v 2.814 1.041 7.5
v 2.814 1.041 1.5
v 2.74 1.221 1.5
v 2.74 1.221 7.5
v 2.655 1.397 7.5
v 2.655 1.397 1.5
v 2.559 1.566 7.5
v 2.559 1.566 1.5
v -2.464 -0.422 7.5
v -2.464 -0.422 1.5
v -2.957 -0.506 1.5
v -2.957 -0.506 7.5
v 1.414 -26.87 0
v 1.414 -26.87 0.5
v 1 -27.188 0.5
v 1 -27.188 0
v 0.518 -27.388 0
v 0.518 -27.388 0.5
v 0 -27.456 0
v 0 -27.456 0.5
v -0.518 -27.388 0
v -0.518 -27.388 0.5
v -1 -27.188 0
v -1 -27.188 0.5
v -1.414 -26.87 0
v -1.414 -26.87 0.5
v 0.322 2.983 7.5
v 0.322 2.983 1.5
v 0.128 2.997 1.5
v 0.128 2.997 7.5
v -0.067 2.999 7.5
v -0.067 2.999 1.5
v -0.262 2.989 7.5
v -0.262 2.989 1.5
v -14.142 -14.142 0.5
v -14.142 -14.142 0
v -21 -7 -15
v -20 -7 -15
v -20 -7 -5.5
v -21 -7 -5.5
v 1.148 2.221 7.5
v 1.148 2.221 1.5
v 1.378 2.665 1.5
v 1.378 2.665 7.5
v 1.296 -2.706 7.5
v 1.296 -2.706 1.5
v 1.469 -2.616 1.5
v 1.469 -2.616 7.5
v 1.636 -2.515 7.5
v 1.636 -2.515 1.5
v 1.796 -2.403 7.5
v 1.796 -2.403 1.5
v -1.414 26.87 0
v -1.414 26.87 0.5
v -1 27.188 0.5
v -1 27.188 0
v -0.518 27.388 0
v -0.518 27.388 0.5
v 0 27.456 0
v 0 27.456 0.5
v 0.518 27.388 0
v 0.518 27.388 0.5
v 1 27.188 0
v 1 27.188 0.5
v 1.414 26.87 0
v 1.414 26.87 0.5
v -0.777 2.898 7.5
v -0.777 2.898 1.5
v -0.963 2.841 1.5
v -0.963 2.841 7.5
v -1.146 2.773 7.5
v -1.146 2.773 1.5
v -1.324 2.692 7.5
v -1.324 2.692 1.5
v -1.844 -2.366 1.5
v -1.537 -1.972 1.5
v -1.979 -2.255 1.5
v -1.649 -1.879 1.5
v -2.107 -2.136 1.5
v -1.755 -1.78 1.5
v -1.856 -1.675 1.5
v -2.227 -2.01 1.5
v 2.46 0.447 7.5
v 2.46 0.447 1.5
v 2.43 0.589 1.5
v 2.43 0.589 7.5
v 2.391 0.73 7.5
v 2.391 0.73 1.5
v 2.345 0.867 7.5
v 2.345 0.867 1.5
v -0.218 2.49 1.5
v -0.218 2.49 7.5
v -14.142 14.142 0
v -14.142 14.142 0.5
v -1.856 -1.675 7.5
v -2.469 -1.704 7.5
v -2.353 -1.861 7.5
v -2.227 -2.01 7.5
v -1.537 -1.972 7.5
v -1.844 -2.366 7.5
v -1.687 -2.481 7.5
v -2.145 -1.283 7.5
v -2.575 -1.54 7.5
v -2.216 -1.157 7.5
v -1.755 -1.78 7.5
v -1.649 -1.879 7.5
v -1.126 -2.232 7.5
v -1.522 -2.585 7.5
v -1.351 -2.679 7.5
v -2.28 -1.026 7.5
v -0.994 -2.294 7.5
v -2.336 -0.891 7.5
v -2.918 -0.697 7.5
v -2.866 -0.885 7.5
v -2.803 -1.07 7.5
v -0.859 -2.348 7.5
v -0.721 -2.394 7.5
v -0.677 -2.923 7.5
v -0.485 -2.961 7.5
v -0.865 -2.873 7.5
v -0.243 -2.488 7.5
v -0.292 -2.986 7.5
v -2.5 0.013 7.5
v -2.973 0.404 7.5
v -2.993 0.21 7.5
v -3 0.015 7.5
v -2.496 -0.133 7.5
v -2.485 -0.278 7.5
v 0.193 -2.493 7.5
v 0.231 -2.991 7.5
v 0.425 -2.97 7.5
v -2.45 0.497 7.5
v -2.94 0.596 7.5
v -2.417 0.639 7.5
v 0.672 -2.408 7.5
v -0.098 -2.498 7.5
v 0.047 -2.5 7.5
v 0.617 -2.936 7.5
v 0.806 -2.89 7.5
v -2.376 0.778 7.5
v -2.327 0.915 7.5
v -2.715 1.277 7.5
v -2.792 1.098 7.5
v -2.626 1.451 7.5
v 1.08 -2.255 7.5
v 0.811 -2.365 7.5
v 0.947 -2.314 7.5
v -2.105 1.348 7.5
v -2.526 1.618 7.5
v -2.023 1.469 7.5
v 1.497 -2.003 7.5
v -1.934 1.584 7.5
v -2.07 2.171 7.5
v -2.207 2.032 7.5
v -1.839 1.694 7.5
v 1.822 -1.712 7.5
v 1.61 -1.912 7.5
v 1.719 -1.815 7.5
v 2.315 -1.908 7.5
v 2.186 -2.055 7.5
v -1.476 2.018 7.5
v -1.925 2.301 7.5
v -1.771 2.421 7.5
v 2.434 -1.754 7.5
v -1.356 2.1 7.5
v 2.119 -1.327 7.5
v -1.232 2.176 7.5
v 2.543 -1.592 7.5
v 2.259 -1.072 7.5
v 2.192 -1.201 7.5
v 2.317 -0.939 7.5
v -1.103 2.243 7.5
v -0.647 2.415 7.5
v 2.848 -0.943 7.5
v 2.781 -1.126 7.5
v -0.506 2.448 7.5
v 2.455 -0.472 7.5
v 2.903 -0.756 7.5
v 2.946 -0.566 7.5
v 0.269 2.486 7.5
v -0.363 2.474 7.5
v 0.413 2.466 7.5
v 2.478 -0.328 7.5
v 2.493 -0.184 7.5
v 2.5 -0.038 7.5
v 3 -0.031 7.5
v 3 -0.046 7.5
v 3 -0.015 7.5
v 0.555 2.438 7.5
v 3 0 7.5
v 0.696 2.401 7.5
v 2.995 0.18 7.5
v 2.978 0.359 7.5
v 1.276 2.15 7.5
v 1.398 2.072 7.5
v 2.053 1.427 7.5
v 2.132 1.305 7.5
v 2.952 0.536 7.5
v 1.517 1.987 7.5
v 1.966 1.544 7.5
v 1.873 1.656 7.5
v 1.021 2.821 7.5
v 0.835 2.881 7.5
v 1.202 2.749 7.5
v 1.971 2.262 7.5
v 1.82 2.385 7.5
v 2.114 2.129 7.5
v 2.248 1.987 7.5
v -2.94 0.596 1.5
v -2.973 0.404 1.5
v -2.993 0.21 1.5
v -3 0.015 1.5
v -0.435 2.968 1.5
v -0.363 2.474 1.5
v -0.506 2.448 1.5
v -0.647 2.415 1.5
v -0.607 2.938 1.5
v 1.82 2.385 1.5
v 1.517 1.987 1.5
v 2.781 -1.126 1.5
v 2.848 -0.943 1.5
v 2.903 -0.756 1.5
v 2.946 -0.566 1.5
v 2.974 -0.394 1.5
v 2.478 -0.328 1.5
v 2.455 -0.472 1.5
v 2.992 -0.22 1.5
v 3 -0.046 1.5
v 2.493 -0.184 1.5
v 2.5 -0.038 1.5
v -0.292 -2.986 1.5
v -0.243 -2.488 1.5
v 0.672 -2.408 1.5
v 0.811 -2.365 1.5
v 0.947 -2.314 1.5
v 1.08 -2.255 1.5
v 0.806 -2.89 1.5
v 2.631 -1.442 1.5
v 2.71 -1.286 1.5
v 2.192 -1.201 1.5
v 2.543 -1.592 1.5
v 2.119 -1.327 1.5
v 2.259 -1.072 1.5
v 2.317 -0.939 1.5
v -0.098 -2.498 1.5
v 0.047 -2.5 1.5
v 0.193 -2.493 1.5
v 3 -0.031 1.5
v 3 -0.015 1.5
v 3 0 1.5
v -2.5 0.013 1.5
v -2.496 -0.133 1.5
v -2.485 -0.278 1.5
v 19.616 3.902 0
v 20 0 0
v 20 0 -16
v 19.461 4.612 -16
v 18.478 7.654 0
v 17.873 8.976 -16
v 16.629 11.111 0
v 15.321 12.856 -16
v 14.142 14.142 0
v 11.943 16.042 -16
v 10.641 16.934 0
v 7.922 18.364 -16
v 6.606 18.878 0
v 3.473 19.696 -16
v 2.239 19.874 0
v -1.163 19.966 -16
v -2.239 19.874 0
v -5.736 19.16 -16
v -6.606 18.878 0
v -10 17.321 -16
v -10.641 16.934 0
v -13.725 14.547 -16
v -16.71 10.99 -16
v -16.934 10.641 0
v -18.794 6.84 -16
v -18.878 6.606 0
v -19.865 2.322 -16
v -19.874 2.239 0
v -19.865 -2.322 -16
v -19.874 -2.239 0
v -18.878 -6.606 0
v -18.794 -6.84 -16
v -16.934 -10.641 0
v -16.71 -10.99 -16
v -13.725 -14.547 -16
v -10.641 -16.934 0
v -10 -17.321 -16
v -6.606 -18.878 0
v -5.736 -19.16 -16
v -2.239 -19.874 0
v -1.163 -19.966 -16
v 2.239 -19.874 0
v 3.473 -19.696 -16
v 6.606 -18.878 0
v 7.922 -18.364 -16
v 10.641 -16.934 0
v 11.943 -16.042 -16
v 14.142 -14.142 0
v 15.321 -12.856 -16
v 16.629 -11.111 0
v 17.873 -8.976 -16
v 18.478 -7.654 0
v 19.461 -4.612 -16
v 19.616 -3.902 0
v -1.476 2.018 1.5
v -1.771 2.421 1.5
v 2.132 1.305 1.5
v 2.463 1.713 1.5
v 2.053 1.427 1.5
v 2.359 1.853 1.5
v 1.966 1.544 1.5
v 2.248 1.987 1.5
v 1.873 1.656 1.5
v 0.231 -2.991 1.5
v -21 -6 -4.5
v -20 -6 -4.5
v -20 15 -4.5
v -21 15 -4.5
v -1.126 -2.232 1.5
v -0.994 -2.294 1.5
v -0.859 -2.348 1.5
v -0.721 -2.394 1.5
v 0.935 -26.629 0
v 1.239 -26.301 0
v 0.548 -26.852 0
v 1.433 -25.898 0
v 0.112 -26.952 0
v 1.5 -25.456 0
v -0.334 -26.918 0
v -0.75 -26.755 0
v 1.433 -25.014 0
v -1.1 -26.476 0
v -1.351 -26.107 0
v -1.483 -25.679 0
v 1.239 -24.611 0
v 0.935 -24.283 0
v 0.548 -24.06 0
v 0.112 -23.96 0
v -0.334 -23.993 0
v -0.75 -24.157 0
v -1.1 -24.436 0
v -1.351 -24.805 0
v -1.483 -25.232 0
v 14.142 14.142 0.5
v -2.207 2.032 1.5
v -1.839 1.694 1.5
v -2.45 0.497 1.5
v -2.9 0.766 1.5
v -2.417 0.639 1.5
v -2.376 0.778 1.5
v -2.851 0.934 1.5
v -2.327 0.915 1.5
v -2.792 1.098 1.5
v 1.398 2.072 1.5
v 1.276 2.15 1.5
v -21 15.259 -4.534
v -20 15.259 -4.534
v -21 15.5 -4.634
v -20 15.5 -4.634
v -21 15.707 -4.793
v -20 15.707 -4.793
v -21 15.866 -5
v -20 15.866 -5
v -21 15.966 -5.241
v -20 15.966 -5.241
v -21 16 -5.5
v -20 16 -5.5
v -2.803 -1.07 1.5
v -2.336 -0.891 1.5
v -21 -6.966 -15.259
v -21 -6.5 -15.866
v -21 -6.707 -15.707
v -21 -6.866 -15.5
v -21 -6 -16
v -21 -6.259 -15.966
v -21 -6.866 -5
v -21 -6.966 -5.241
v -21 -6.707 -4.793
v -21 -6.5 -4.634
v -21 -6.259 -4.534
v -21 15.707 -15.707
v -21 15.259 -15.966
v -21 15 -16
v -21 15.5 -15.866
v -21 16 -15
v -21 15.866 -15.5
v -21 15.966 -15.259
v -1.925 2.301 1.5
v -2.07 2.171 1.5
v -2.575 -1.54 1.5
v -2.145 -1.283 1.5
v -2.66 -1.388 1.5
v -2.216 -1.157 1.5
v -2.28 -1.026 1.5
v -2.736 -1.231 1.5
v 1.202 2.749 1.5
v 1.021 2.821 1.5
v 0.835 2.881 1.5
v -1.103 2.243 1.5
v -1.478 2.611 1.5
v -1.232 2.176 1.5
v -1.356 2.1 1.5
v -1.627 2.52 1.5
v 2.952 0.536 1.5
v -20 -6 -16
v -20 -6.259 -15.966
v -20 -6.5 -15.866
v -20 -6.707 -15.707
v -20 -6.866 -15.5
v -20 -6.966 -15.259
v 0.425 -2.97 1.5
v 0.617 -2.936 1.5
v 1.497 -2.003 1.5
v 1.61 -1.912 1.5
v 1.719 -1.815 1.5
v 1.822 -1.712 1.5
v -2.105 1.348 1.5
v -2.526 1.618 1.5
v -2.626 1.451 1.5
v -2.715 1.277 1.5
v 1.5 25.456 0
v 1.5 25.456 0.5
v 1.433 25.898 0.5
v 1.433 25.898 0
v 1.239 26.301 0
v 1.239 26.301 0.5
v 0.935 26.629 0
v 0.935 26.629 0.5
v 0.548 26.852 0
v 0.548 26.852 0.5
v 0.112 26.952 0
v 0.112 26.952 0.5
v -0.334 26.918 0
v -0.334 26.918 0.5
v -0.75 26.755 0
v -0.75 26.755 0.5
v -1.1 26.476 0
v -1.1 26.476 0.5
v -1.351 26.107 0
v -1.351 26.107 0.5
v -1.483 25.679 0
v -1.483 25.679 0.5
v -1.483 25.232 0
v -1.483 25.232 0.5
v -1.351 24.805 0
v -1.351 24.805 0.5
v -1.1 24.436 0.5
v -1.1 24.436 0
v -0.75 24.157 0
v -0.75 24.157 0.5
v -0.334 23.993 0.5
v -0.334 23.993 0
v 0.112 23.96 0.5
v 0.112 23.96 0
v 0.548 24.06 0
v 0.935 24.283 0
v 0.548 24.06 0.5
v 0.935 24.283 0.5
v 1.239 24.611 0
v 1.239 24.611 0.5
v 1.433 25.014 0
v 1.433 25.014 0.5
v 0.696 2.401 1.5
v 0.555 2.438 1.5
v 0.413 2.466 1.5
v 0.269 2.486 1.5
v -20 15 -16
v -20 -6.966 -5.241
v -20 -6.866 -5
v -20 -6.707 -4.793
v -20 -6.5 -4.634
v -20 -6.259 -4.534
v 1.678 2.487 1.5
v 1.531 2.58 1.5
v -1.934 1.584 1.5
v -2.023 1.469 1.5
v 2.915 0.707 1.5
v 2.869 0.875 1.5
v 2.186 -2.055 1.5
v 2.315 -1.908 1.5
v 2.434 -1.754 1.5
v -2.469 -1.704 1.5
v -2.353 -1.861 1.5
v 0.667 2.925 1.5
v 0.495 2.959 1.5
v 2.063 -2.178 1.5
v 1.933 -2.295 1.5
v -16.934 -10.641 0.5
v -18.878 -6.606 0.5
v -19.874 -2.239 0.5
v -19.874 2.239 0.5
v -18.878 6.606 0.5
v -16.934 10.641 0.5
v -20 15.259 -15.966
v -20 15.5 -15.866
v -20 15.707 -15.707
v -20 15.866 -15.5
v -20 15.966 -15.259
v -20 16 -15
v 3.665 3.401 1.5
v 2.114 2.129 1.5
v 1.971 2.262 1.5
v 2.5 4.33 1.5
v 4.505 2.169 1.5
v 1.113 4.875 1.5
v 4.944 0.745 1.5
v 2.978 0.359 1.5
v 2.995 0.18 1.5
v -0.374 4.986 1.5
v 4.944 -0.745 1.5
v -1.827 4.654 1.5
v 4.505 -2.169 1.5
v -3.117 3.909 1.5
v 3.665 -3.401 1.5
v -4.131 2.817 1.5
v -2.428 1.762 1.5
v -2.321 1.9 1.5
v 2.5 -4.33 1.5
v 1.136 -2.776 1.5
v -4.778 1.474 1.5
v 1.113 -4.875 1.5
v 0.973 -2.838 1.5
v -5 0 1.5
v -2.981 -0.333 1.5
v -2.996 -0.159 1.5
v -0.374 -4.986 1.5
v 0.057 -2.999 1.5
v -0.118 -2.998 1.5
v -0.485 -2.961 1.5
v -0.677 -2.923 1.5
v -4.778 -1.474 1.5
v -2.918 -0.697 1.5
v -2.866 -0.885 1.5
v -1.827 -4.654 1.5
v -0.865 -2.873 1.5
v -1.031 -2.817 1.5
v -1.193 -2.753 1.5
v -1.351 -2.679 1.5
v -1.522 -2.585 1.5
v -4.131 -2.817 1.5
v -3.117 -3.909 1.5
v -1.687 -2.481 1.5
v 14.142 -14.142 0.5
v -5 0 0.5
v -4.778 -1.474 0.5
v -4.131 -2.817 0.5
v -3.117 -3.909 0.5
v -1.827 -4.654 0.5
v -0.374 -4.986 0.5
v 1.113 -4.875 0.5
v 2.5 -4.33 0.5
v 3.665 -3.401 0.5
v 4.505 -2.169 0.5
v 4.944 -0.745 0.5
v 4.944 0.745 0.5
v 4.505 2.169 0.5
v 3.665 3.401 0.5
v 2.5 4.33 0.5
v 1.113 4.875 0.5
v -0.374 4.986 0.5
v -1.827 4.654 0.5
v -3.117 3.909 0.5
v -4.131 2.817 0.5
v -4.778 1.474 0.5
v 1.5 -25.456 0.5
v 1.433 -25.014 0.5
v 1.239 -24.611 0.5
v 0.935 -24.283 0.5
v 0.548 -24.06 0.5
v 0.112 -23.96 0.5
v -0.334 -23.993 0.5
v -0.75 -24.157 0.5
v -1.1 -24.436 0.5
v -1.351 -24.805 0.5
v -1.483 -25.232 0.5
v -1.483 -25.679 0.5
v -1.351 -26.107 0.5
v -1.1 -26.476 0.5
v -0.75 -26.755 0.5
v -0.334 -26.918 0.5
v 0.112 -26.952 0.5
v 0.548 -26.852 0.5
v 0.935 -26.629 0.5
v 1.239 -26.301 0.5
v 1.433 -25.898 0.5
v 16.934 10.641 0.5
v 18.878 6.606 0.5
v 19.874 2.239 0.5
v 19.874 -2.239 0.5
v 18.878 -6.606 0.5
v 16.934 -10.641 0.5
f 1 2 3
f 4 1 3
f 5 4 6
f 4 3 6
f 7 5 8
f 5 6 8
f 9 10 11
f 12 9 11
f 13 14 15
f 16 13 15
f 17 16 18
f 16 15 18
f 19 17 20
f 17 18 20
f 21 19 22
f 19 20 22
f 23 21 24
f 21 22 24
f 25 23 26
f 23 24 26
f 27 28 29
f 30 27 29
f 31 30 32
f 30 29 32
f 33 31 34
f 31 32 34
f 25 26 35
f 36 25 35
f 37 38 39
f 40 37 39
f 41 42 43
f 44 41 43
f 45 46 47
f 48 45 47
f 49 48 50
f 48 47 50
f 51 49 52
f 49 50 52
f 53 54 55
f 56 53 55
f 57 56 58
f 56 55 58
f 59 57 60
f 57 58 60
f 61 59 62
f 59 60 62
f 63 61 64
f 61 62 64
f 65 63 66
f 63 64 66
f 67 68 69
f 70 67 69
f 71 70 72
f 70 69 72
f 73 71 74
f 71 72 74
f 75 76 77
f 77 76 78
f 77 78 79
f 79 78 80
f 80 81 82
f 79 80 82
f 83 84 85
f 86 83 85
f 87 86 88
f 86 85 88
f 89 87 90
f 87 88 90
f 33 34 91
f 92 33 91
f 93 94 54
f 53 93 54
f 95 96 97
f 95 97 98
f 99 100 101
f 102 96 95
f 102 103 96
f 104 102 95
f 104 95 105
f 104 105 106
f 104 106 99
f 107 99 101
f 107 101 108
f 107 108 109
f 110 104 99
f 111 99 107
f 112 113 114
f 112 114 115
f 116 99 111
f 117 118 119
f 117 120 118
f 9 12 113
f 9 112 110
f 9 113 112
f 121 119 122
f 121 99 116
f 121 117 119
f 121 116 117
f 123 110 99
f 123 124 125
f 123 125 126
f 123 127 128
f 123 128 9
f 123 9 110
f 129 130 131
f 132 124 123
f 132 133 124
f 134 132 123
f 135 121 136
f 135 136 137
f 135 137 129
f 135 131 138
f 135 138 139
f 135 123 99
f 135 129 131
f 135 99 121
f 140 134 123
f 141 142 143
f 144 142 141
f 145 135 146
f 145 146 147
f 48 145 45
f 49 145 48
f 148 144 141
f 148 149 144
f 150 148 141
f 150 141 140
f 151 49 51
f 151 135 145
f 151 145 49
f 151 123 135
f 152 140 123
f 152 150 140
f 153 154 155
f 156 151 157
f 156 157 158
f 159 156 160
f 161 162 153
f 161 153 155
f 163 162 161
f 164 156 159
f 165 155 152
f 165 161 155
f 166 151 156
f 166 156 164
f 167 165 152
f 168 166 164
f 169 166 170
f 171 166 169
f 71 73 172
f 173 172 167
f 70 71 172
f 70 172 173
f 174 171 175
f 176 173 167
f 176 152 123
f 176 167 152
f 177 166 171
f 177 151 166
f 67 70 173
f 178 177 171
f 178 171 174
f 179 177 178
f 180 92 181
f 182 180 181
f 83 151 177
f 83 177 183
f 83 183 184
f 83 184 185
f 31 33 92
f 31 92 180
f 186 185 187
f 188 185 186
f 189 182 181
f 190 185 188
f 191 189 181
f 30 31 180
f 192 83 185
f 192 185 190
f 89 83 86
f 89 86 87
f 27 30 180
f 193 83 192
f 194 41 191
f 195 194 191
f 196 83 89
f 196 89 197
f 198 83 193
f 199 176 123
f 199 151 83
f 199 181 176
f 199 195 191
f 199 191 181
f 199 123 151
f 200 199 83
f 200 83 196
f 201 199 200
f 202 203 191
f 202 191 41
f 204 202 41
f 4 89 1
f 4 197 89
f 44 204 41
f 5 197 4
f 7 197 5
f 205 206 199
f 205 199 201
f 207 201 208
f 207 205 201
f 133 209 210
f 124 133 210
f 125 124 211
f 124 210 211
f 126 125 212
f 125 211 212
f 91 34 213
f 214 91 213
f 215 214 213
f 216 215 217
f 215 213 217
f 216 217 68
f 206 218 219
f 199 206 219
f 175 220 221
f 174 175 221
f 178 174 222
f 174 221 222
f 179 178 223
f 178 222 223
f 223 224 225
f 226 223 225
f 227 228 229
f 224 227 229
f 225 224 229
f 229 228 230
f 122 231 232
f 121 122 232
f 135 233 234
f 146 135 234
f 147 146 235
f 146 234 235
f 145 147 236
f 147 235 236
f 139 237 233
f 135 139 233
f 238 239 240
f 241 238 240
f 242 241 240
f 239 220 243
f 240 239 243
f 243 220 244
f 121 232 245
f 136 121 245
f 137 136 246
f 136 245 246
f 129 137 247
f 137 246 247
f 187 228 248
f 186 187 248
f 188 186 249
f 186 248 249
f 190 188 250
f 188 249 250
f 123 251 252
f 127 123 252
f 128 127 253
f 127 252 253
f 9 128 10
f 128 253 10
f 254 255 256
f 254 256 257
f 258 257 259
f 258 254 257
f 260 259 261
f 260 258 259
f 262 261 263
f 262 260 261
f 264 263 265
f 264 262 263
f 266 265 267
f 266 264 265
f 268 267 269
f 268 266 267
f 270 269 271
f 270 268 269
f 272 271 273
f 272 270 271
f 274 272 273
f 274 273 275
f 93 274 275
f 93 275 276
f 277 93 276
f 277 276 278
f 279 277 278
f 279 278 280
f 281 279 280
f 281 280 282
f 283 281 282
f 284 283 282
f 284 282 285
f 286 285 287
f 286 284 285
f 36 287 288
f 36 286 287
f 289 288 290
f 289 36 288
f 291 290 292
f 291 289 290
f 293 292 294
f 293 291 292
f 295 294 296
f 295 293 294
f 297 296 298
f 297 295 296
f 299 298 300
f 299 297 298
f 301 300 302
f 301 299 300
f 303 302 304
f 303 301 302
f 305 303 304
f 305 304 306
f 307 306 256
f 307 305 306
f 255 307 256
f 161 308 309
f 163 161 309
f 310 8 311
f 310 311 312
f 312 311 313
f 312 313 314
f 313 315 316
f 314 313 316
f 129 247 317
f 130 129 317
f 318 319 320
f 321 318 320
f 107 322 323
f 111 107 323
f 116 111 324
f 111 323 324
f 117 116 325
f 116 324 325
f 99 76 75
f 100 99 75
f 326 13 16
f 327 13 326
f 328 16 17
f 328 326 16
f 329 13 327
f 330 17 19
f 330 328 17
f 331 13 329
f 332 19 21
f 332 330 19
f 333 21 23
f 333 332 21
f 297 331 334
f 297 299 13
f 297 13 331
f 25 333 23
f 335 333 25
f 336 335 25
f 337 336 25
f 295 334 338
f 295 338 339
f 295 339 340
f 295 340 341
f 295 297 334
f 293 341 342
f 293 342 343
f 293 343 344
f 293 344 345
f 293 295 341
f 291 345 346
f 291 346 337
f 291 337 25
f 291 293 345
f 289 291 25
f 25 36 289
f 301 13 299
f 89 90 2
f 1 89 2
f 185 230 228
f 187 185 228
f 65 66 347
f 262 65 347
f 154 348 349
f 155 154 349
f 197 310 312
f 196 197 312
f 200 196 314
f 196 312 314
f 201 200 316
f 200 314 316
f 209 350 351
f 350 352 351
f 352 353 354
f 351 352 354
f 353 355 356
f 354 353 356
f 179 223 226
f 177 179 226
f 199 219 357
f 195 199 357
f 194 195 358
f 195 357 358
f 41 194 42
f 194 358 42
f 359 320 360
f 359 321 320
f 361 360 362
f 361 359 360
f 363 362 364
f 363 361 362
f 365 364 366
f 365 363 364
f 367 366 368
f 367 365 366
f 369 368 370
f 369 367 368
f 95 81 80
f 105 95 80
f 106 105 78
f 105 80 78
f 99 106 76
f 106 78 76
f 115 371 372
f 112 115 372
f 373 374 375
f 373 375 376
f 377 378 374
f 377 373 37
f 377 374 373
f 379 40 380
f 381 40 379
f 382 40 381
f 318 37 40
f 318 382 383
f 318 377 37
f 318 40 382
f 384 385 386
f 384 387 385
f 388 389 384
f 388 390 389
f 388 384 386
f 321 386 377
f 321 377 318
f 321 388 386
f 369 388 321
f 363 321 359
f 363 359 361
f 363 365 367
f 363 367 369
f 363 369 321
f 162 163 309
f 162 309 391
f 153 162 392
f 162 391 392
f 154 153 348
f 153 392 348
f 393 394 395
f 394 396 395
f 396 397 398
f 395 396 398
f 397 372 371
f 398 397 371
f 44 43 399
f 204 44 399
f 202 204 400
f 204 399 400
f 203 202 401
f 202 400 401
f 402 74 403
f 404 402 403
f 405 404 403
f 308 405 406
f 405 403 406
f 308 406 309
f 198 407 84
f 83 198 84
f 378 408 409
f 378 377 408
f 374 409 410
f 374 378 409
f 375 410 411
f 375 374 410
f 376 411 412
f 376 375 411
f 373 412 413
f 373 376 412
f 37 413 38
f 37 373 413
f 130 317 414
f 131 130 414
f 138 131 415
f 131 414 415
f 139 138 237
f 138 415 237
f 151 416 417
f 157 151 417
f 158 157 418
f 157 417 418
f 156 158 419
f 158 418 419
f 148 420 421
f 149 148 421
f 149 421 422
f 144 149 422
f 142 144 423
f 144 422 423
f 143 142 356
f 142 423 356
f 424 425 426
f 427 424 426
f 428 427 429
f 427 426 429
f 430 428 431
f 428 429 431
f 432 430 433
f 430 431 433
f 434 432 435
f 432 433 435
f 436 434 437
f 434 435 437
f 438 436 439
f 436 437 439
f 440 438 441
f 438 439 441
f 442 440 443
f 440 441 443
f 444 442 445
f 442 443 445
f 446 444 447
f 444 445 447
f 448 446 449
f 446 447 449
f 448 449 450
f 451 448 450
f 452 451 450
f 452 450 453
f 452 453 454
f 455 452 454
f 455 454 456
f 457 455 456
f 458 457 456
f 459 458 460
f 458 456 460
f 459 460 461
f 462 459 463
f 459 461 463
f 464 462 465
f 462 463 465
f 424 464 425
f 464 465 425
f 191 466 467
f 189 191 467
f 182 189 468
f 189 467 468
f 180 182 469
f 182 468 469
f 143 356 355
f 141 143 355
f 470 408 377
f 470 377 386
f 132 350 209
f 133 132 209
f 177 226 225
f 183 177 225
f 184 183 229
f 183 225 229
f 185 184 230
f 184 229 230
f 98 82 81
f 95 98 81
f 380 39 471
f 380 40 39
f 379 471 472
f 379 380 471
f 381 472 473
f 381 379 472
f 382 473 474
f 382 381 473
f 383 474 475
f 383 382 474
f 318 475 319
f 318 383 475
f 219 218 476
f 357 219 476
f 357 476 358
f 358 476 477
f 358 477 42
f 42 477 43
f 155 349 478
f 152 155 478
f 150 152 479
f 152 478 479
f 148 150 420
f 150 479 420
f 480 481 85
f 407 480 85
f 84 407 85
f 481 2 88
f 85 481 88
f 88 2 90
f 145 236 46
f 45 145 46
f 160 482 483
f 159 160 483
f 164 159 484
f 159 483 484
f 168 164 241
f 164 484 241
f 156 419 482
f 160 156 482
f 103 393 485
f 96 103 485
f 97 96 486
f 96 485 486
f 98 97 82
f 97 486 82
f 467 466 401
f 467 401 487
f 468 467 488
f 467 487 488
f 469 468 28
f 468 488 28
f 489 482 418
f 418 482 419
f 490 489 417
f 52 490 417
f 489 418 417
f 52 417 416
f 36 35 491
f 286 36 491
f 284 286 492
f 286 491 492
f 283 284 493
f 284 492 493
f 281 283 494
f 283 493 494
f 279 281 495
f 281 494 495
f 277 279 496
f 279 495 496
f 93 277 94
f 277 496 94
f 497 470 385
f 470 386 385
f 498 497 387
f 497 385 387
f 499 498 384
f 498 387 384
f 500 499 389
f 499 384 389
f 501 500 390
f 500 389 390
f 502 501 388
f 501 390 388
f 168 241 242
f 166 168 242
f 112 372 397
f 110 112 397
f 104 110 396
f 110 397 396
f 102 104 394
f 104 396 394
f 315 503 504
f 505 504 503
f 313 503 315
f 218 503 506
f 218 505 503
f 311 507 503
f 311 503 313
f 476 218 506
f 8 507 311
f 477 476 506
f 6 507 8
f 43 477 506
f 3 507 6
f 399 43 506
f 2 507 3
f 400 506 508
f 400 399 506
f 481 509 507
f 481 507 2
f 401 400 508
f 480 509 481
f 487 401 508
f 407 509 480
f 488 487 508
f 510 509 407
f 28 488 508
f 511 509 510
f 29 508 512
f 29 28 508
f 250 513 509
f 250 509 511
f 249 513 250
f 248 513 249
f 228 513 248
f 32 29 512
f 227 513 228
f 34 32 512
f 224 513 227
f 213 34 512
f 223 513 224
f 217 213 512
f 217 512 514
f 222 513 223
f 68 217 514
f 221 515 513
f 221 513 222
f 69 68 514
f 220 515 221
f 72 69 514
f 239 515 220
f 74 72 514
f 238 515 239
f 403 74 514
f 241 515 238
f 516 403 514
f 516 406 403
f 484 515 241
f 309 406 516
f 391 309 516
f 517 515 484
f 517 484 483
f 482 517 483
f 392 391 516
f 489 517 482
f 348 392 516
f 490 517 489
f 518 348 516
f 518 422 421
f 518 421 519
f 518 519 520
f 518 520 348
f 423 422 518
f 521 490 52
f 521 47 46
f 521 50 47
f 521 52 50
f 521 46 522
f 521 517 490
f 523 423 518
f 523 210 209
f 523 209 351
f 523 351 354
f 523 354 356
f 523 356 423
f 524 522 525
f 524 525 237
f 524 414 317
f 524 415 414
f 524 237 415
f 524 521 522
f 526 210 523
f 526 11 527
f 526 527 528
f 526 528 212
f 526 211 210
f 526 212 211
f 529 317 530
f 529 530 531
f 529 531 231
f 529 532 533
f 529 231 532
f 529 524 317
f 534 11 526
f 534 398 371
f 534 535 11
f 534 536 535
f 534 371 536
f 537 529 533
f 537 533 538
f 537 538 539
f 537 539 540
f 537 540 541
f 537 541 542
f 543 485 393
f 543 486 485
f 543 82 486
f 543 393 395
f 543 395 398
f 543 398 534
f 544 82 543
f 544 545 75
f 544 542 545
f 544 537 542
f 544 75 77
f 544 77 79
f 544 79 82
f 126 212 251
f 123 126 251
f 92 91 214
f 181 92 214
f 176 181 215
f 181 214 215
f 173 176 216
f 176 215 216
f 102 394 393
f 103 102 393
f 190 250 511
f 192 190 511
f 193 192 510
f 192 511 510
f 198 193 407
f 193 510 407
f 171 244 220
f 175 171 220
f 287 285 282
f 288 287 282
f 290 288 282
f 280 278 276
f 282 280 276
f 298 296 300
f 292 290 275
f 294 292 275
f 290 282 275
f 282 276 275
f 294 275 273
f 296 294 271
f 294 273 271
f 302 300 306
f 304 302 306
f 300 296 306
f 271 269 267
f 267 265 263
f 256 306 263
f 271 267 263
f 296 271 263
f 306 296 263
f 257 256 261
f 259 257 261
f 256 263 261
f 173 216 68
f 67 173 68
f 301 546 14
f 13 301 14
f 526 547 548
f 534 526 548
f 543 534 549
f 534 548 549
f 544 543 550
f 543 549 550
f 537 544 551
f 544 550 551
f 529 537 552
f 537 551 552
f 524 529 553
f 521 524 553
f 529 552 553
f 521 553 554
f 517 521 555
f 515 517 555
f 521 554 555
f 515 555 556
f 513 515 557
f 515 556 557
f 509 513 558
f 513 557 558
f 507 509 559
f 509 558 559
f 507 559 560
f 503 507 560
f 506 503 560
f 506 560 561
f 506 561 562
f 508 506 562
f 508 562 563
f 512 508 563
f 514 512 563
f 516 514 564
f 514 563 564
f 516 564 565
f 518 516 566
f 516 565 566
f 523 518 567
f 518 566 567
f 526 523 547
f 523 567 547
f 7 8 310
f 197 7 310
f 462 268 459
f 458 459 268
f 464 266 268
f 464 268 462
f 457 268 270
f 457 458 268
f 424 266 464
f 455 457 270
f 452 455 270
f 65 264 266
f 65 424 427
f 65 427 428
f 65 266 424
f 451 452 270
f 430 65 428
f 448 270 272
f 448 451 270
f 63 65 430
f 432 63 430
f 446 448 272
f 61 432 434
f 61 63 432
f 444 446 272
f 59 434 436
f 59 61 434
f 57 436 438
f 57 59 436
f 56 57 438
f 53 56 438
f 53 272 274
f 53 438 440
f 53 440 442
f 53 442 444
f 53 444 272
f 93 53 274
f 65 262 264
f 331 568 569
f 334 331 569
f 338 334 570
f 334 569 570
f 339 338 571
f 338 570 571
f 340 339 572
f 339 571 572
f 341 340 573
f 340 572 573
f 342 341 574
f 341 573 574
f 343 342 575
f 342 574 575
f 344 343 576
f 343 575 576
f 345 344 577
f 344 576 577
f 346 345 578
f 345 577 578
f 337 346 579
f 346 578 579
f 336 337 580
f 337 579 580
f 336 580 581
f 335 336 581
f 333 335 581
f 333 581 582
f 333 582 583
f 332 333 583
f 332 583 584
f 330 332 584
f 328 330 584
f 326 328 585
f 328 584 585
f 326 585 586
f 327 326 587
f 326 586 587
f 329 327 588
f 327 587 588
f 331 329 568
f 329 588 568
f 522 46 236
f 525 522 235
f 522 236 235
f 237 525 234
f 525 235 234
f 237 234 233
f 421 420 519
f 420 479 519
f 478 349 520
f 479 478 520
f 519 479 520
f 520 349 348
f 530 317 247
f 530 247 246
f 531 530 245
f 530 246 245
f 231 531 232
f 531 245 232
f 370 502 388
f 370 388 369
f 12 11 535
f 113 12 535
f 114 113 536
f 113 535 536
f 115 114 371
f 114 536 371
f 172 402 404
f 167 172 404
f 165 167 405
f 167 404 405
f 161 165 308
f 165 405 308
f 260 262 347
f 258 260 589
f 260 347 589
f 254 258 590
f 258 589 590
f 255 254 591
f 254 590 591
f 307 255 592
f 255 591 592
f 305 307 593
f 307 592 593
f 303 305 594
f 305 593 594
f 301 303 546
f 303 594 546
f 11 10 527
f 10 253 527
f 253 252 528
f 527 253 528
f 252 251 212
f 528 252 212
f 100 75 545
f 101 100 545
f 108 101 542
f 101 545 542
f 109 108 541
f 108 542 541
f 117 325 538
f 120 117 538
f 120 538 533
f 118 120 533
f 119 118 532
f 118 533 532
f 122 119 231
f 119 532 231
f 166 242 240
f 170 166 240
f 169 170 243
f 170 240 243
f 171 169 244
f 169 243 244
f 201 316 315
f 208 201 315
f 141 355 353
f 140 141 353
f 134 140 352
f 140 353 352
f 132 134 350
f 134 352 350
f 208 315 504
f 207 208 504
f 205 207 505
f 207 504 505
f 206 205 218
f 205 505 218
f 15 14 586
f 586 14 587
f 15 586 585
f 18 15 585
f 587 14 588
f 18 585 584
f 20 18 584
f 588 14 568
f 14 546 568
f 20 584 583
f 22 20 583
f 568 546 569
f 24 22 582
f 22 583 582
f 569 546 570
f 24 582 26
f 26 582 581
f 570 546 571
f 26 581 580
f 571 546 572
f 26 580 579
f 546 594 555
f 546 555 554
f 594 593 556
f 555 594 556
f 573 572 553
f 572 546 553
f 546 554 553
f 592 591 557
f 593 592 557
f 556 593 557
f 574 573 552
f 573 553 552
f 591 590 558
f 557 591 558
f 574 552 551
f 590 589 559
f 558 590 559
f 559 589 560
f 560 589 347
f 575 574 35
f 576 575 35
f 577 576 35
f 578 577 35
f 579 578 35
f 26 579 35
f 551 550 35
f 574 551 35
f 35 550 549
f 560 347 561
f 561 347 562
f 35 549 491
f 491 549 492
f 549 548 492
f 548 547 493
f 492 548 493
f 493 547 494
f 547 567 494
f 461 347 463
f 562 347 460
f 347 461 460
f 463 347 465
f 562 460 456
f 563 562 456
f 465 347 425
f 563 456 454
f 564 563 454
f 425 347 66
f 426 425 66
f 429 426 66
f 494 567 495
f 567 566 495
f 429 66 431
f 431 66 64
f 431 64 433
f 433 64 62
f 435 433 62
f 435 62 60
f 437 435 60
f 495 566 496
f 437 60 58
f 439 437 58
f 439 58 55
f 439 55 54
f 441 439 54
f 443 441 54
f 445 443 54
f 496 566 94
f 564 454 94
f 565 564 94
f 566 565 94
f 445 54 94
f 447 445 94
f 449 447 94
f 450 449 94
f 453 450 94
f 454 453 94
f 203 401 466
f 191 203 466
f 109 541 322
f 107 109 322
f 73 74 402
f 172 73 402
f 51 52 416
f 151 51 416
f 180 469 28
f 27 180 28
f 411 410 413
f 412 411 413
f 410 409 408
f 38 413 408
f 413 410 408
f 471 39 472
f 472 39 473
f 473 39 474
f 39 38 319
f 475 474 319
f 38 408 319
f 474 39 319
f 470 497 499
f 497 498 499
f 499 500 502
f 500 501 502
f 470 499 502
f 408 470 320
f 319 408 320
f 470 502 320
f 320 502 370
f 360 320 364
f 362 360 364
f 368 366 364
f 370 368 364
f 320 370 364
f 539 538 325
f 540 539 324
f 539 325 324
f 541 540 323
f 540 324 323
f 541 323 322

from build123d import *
from build123d.topology import SkipClean

# Parameters (mm, degrees)
SKETCH1_R           = 20
BOSS_EXTRUDE1_DEPTH = 16
BOSS_EXTRUDE3_START = 0.5
SKETCH3_R           = 1.5
BOSS_EXTRUDE3_DEPTH = 0.5
SKETCH4_R           = 5
BOSS_EXTRUDE4_DEPTH = 1
SKETCH5_R           = 3
BOSS_EXTRUDE5_DEPTH = 6
CUT_EXTRUDE1_START  = -6
CUT_EXTRUDE1_DEPTH  = 6
SKETCH8_W           = 11.5
SKETCH8_H           = 23
BOSS_EXTRUDE6_DEPTH = 1
FILLET1_R           = 1


with BuildPart() as part:
    # Sketch1 → Boss-Extrude1 (new body)
    with BuildSketch(Plane.XY):
        Circle(SKETCH1_R)
    extrude(amount=-BOSS_EXTRUDE1_DEPTH)

    # Sketch3 → Boss-Extrude3 (add)
    with SkipClean():  # the faces are left unmerged after this step: merging them gives an invalid solid
        with BuildSketch(Plane.XY.offset(BOSS_EXTRUDE3_START)):
            with BuildLine():
                Line((-14.142135624, 14.142135624), (-1.414213562, 26.870057685))
                ThreePointArc((-1.414213562, 26.870057685), (0, 27.455844123), (1.414213562, 26.870057685))
                Line((1.414213562, 26.870057685), (14.142135624, 14.142135624))
                ThreePointArc((14.142135624, 14.142135624), (20, 0), (14.142135624, -14.142135624))
                Line((14.142135624, -14.142135624), (1.414213562, -26.870057685))
                ThreePointArc((1.414213562, -26.870057685), (0, -27.455844123), (-1.414213562, -26.870057685))
                Line((-1.414213562, -26.870057685), (-14.142135624, -14.142135624))
                ThreePointArc((-14.142135624, -14.142135624), (-20, 0), (-14.142135624, 14.142135624))
            make_face()
            with Locations((0, -25.455844123)):
                Circle(SKETCH3_R, mode=Mode.SUBTRACT)
            with Locations((0, 25.455844123)):
                Circle(SKETCH3_R, mode=Mode.SUBTRACT)
        extrude(amount=-BOSS_EXTRUDE3_DEPTH)

    # Sketch4 → Boss-Extrude4 (add)
    with SkipClean():  # the faces are left unmerged after this step: merging them gives an invalid solid
        with BuildSketch(Plane.XY.offset(0.5)):
            with Locations(Location((0, 0, 0), (0, 0, 180))):
                Circle(SKETCH4_R)
        extrude(amount=BOSS_EXTRUDE4_DEPTH)

    # Sketch5 → Boss-Extrude5 (add)
    with SkipClean():  # the faces are left unmerged after this step: merging them gives an invalid solid
        with BuildSketch(Plane.XY.offset(1.5)):
            Circle(SKETCH5_R)
        extrude(amount=BOSS_EXTRUDE5_DEPTH)

    # Sketch6 → Cut-Extrude1 (cut)
    with SkipClean():  # the faces are left unmerged after this step: merging them gives an invalid solid
        with BuildSketch(Plane.XY.offset(7.5).offset(CUT_EXTRUDE1_START)):
            with BuildLine():
                Line((-2.464171335, -0.421734077), (-2.957005602, -0.506080893))
                ThreePointArc((-2.957005602, -0.506080893), (-2.989861159, -0.246435082), (-2.999962067, 0.015086247))
                Line((-2.999962067, 0.015086247), (-2.499968389, 0.012571873))
                ThreePointArc((-2.499968389, 0.012571873), (-2.491550966, -0.205362569), (-2.464171335, -0.421734077))
            make_face()
            with BuildLine():
                Line((-2.450119259, 0.496906044), (-2.940143111, 0.596287252))
                ThreePointArc((-2.940143111, 0.596287252), (-2.87698512, 0.850268556), (-2.791931536, 1.097778802))
                Line((-2.791931536, 1.097778802), (-2.326609613, 0.914815669))
                ThreePointArc((-2.326609613, 0.914815669), (-2.3974876, 0.70855713), (-2.450119259, 0.496906044))
            make_face()
            with BuildLine():
                Line((-2.145423418, -1.283416674), (-2.574508101, -1.540100009))
                ThreePointArc((-2.574508101, -1.540100009), (-2.698939881, -1.309856297), (-2.802831098, -1.069643789))
                Line((-2.802831098, -1.069643789), (-2.335692582, -0.891369824))
                ThreePointArc((-2.335692582, -0.891369824), (-2.249116567, -1.091546915), (-2.145423418, -1.283416674))
            make_face()
            with BuildLine():
                Line((-2.105165001, 1.34843625), (-2.526198001, 1.6181235))
                ThreePointArc((-2.526198001, 1.6181235), (-2.375556299, 1.832138714), (-2.20683518, 2.032210247))
                Line((-2.20683518, 2.032210247), (-1.839029317, 1.693508539))
                ThreePointArc((-1.839029317, 1.693508539), (-1.979630249, 1.526782262), (-2.105165001, 1.34843625))
            make_face()
            with BuildLine():
                Line((-1.475896544, 2.017852669), (-1.771075853, 2.421423202))
                ThreePointArc((-1.771075853, 2.421423202), (-1.553295437, 2.566568387), (-1.323693504, 2.692180437))
                Line((-1.323693504, 2.692180437), (-1.10307792, 2.243483698))
                ThreePointArc((-1.10307792, 2.243483698), (-1.294412864, 2.138806989), (-1.475896544, 2.017852669))
            make_face()
            with BuildLine():
                Line((-0.64730008, 2.414746903), (-0.776760097, 2.897696284))
                ThreePointArc((-0.776760097, 2.897696284), (-0.521253418, 2.954368778), (-0.261779686, 2.988556741))
                Line((-0.261779686, 2.988556741), (-0.218149739, 2.490463951))
                ThreePointArc((-0.218149739, 2.490463951), (-0.434377848, 2.461973981), (-0.64730008, 2.414746903))
            make_face()
            with BuildLine():
                Line((0.268717846, 2.485516188), (0.322461415, 2.982619425))
                ThreePointArc((0.322461415, 2.982619425), (0.581186763, 2.943165294), (0.835488929, 2.881311897))
                Line((0.835488929, 2.881311897), (0.696240774, 2.401093248))
                ThreePointArc((0.696240774, 2.401093248), (0.484322303, 2.452637745), (0.268717846, 2.485516188))
            make_face()
            with BuildLine():
                Line((1.148443938, 2.220602739), (1.378132725, 2.664723286))
                ThreePointArc((1.378132725, 2.664723286), (1.605134451, 2.534471028), (1.819920135, 2.384929916))
                Line((1.819920135, 2.384929916), (1.516600112, 1.987441596))
                ThreePointArc((1.516600112, 1.987441596), (1.337612043, 2.11205919), (1.148443938, 2.220602739))
            make_face()
            with BuildLine():
                Line((1.873066312, 1.655784585), (2.247679574, 1.986941502))
                ThreePointArc((2.247679574, 1.986941502), (2.412299837, 1.783482407), (2.558561042, 1.566449934))
                Line((2.558561042, 1.566449934), (2.132134202, 1.305374945))
                ThreePointArc((2.132134202, 1.305374945), (2.010249864, 1.486235339), (1.873066312, 1.655784585))
            make_face()
            with BuildLine():
                Line((2.344720702, 0.867343548), (2.813664842, 1.040812257))
                ThreePointArc((2.813664842, 1.040812257), (2.893670764, 0.791624603), (2.951654103, 0.536412208))
                Line((2.951654103, 0.536412208), (2.459711752, 0.447010173))
                ThreePointArc((2.459711752, 0.447010173), (2.411392303, 0.659687169), (2.344720702, 0.867343548))
            make_face()
            with BuildLine():
                Line((2.499707569, -0.038237042), (2.999649082, -0.04588445))
                ThreePointArc((2.999649082, -0.04588445), (2.984235419, -0.307146489), (2.946109922, -0.566070959))
                Line((2.946109922, -0.566070959), (2.455091601, -0.471725799))
                ThreePointArc((2.455091601, -0.471725799), (2.486862849, -0.255955408), (2.499707569, -0.038237042))
            make_face()
            with BuildLine():
                Line((2.317095077, -0.938653506), (2.780514092, -1.126384208))
                ThreePointArc((2.780514092, -1.126384208), (2.671762544, -1.364435747), (2.54267727, -1.592103106))
                Line((2.54267727, -1.592103106), (2.118897725, -1.326752588))
                ThreePointArc((2.118897725, -1.326752588), (2.226468787, -1.137029789), (2.317095077, -0.938653506))
            make_face()
            with BuildLine():
                Line((1.821546055, -1.712299614), (2.185855266, -2.054759537))
                ThreePointArc((2.185855266, -2.054759537), (1.998453334, -2.237450396), (1.795841964, -2.403112906))
                Line((1.795841964, -2.403112906), (1.49653497, -2.002594088))
                ThreePointArc((1.49653497, -2.002594088), (1.665377778, -1.864541996), (1.821546055, -1.712299614))
            make_face()
            with BuildLine():
                Line((1.079987146, -2.254690171), (1.295984575, -2.705628205))
                ThreePointArc((1.295984575, -2.705628205), (1.055241926, -2.808284971), (0.80646825, -2.889568992))
                Line((0.80646825, -2.889568992), (0.672056875, -2.40797416))
                ThreePointArc((0.672056875, -2.40797416), (0.879368272, -2.340237476), (1.079987146, -2.254690171))
            make_face()
            with BuildLine():
                Line((0.192569987, -2.492572326), (0.231083985, -2.991086791))
                ThreePointArc((0.231083985, -2.991086791), (-0.03048575, -2.999845099), (-0.291823471, -2.985772775))
                Line((-0.291823471, -2.985772775), (-0.243186225, -2.488143979))
                ThreePointArc((-0.243186225, -2.488143979), (-0.025404792, -2.499870916), (0.192569987, -2.492572326))
            make_face()
            with BuildLine():
                Line((-0.720854815, -2.393818777), (-0.865025778, -2.872582532))
                ThreePointArc((-0.865025778, -2.872582532), (-1.112096158, -2.786259524), (-1.350702814, -2.678731399))
                Line((-1.350702814, -2.678731399), (-1.125585679, -2.232276166))
                ThreePointArc((-1.125585679, -2.232276166), (-0.926746798, -2.321882937), (-0.720854815, -2.393818777))
            make_face()
            with BuildLine():
                Line((-1.53692418, -1.971766737), (-1.844309015, -2.366120085))
                ThreePointArc((-1.844309015, -2.366120085), (-2.043511816, -2.196374161), (-2.227162258, -2.009912504))
                Line((-2.227162258, -2.009912504), (-1.855968549, -1.674927087))
                ThreePointArc((-1.855968549, -1.674927087), (-1.702926514, -1.830311801), (-1.53692418, -1.971766737))
            make_face()
        extrude(amount=CUT_EXTRUDE1_DEPTH, mode=Mode.SUBTRACT)


with BuildPart() as body_2:
    # Sketch8 → Boss-Extrude6 (new body)
    with BuildSketch(Plane.ZY.offset(20)):
        with Locations((-10.25, 4.5)):
            Rectangle(SKETCH8_W, SKETCH8_H)
    extrude(amount=BOSS_EXTRUDE6_DEPTH)

    # Fillet1
    fillet1_edges = [body_2.edges().sort_by_distance(p)[0] for p in [
        (-20.5, 16, -16),
        (-20.5, 16, -4.5),
        (-20.5, -7, -4.5),
        (-20.5, -7, -16),
    ]]
    fillet(fillet1_edges, radius=FILLET1_R)


solid = Compound([part.part, body_2.part])
